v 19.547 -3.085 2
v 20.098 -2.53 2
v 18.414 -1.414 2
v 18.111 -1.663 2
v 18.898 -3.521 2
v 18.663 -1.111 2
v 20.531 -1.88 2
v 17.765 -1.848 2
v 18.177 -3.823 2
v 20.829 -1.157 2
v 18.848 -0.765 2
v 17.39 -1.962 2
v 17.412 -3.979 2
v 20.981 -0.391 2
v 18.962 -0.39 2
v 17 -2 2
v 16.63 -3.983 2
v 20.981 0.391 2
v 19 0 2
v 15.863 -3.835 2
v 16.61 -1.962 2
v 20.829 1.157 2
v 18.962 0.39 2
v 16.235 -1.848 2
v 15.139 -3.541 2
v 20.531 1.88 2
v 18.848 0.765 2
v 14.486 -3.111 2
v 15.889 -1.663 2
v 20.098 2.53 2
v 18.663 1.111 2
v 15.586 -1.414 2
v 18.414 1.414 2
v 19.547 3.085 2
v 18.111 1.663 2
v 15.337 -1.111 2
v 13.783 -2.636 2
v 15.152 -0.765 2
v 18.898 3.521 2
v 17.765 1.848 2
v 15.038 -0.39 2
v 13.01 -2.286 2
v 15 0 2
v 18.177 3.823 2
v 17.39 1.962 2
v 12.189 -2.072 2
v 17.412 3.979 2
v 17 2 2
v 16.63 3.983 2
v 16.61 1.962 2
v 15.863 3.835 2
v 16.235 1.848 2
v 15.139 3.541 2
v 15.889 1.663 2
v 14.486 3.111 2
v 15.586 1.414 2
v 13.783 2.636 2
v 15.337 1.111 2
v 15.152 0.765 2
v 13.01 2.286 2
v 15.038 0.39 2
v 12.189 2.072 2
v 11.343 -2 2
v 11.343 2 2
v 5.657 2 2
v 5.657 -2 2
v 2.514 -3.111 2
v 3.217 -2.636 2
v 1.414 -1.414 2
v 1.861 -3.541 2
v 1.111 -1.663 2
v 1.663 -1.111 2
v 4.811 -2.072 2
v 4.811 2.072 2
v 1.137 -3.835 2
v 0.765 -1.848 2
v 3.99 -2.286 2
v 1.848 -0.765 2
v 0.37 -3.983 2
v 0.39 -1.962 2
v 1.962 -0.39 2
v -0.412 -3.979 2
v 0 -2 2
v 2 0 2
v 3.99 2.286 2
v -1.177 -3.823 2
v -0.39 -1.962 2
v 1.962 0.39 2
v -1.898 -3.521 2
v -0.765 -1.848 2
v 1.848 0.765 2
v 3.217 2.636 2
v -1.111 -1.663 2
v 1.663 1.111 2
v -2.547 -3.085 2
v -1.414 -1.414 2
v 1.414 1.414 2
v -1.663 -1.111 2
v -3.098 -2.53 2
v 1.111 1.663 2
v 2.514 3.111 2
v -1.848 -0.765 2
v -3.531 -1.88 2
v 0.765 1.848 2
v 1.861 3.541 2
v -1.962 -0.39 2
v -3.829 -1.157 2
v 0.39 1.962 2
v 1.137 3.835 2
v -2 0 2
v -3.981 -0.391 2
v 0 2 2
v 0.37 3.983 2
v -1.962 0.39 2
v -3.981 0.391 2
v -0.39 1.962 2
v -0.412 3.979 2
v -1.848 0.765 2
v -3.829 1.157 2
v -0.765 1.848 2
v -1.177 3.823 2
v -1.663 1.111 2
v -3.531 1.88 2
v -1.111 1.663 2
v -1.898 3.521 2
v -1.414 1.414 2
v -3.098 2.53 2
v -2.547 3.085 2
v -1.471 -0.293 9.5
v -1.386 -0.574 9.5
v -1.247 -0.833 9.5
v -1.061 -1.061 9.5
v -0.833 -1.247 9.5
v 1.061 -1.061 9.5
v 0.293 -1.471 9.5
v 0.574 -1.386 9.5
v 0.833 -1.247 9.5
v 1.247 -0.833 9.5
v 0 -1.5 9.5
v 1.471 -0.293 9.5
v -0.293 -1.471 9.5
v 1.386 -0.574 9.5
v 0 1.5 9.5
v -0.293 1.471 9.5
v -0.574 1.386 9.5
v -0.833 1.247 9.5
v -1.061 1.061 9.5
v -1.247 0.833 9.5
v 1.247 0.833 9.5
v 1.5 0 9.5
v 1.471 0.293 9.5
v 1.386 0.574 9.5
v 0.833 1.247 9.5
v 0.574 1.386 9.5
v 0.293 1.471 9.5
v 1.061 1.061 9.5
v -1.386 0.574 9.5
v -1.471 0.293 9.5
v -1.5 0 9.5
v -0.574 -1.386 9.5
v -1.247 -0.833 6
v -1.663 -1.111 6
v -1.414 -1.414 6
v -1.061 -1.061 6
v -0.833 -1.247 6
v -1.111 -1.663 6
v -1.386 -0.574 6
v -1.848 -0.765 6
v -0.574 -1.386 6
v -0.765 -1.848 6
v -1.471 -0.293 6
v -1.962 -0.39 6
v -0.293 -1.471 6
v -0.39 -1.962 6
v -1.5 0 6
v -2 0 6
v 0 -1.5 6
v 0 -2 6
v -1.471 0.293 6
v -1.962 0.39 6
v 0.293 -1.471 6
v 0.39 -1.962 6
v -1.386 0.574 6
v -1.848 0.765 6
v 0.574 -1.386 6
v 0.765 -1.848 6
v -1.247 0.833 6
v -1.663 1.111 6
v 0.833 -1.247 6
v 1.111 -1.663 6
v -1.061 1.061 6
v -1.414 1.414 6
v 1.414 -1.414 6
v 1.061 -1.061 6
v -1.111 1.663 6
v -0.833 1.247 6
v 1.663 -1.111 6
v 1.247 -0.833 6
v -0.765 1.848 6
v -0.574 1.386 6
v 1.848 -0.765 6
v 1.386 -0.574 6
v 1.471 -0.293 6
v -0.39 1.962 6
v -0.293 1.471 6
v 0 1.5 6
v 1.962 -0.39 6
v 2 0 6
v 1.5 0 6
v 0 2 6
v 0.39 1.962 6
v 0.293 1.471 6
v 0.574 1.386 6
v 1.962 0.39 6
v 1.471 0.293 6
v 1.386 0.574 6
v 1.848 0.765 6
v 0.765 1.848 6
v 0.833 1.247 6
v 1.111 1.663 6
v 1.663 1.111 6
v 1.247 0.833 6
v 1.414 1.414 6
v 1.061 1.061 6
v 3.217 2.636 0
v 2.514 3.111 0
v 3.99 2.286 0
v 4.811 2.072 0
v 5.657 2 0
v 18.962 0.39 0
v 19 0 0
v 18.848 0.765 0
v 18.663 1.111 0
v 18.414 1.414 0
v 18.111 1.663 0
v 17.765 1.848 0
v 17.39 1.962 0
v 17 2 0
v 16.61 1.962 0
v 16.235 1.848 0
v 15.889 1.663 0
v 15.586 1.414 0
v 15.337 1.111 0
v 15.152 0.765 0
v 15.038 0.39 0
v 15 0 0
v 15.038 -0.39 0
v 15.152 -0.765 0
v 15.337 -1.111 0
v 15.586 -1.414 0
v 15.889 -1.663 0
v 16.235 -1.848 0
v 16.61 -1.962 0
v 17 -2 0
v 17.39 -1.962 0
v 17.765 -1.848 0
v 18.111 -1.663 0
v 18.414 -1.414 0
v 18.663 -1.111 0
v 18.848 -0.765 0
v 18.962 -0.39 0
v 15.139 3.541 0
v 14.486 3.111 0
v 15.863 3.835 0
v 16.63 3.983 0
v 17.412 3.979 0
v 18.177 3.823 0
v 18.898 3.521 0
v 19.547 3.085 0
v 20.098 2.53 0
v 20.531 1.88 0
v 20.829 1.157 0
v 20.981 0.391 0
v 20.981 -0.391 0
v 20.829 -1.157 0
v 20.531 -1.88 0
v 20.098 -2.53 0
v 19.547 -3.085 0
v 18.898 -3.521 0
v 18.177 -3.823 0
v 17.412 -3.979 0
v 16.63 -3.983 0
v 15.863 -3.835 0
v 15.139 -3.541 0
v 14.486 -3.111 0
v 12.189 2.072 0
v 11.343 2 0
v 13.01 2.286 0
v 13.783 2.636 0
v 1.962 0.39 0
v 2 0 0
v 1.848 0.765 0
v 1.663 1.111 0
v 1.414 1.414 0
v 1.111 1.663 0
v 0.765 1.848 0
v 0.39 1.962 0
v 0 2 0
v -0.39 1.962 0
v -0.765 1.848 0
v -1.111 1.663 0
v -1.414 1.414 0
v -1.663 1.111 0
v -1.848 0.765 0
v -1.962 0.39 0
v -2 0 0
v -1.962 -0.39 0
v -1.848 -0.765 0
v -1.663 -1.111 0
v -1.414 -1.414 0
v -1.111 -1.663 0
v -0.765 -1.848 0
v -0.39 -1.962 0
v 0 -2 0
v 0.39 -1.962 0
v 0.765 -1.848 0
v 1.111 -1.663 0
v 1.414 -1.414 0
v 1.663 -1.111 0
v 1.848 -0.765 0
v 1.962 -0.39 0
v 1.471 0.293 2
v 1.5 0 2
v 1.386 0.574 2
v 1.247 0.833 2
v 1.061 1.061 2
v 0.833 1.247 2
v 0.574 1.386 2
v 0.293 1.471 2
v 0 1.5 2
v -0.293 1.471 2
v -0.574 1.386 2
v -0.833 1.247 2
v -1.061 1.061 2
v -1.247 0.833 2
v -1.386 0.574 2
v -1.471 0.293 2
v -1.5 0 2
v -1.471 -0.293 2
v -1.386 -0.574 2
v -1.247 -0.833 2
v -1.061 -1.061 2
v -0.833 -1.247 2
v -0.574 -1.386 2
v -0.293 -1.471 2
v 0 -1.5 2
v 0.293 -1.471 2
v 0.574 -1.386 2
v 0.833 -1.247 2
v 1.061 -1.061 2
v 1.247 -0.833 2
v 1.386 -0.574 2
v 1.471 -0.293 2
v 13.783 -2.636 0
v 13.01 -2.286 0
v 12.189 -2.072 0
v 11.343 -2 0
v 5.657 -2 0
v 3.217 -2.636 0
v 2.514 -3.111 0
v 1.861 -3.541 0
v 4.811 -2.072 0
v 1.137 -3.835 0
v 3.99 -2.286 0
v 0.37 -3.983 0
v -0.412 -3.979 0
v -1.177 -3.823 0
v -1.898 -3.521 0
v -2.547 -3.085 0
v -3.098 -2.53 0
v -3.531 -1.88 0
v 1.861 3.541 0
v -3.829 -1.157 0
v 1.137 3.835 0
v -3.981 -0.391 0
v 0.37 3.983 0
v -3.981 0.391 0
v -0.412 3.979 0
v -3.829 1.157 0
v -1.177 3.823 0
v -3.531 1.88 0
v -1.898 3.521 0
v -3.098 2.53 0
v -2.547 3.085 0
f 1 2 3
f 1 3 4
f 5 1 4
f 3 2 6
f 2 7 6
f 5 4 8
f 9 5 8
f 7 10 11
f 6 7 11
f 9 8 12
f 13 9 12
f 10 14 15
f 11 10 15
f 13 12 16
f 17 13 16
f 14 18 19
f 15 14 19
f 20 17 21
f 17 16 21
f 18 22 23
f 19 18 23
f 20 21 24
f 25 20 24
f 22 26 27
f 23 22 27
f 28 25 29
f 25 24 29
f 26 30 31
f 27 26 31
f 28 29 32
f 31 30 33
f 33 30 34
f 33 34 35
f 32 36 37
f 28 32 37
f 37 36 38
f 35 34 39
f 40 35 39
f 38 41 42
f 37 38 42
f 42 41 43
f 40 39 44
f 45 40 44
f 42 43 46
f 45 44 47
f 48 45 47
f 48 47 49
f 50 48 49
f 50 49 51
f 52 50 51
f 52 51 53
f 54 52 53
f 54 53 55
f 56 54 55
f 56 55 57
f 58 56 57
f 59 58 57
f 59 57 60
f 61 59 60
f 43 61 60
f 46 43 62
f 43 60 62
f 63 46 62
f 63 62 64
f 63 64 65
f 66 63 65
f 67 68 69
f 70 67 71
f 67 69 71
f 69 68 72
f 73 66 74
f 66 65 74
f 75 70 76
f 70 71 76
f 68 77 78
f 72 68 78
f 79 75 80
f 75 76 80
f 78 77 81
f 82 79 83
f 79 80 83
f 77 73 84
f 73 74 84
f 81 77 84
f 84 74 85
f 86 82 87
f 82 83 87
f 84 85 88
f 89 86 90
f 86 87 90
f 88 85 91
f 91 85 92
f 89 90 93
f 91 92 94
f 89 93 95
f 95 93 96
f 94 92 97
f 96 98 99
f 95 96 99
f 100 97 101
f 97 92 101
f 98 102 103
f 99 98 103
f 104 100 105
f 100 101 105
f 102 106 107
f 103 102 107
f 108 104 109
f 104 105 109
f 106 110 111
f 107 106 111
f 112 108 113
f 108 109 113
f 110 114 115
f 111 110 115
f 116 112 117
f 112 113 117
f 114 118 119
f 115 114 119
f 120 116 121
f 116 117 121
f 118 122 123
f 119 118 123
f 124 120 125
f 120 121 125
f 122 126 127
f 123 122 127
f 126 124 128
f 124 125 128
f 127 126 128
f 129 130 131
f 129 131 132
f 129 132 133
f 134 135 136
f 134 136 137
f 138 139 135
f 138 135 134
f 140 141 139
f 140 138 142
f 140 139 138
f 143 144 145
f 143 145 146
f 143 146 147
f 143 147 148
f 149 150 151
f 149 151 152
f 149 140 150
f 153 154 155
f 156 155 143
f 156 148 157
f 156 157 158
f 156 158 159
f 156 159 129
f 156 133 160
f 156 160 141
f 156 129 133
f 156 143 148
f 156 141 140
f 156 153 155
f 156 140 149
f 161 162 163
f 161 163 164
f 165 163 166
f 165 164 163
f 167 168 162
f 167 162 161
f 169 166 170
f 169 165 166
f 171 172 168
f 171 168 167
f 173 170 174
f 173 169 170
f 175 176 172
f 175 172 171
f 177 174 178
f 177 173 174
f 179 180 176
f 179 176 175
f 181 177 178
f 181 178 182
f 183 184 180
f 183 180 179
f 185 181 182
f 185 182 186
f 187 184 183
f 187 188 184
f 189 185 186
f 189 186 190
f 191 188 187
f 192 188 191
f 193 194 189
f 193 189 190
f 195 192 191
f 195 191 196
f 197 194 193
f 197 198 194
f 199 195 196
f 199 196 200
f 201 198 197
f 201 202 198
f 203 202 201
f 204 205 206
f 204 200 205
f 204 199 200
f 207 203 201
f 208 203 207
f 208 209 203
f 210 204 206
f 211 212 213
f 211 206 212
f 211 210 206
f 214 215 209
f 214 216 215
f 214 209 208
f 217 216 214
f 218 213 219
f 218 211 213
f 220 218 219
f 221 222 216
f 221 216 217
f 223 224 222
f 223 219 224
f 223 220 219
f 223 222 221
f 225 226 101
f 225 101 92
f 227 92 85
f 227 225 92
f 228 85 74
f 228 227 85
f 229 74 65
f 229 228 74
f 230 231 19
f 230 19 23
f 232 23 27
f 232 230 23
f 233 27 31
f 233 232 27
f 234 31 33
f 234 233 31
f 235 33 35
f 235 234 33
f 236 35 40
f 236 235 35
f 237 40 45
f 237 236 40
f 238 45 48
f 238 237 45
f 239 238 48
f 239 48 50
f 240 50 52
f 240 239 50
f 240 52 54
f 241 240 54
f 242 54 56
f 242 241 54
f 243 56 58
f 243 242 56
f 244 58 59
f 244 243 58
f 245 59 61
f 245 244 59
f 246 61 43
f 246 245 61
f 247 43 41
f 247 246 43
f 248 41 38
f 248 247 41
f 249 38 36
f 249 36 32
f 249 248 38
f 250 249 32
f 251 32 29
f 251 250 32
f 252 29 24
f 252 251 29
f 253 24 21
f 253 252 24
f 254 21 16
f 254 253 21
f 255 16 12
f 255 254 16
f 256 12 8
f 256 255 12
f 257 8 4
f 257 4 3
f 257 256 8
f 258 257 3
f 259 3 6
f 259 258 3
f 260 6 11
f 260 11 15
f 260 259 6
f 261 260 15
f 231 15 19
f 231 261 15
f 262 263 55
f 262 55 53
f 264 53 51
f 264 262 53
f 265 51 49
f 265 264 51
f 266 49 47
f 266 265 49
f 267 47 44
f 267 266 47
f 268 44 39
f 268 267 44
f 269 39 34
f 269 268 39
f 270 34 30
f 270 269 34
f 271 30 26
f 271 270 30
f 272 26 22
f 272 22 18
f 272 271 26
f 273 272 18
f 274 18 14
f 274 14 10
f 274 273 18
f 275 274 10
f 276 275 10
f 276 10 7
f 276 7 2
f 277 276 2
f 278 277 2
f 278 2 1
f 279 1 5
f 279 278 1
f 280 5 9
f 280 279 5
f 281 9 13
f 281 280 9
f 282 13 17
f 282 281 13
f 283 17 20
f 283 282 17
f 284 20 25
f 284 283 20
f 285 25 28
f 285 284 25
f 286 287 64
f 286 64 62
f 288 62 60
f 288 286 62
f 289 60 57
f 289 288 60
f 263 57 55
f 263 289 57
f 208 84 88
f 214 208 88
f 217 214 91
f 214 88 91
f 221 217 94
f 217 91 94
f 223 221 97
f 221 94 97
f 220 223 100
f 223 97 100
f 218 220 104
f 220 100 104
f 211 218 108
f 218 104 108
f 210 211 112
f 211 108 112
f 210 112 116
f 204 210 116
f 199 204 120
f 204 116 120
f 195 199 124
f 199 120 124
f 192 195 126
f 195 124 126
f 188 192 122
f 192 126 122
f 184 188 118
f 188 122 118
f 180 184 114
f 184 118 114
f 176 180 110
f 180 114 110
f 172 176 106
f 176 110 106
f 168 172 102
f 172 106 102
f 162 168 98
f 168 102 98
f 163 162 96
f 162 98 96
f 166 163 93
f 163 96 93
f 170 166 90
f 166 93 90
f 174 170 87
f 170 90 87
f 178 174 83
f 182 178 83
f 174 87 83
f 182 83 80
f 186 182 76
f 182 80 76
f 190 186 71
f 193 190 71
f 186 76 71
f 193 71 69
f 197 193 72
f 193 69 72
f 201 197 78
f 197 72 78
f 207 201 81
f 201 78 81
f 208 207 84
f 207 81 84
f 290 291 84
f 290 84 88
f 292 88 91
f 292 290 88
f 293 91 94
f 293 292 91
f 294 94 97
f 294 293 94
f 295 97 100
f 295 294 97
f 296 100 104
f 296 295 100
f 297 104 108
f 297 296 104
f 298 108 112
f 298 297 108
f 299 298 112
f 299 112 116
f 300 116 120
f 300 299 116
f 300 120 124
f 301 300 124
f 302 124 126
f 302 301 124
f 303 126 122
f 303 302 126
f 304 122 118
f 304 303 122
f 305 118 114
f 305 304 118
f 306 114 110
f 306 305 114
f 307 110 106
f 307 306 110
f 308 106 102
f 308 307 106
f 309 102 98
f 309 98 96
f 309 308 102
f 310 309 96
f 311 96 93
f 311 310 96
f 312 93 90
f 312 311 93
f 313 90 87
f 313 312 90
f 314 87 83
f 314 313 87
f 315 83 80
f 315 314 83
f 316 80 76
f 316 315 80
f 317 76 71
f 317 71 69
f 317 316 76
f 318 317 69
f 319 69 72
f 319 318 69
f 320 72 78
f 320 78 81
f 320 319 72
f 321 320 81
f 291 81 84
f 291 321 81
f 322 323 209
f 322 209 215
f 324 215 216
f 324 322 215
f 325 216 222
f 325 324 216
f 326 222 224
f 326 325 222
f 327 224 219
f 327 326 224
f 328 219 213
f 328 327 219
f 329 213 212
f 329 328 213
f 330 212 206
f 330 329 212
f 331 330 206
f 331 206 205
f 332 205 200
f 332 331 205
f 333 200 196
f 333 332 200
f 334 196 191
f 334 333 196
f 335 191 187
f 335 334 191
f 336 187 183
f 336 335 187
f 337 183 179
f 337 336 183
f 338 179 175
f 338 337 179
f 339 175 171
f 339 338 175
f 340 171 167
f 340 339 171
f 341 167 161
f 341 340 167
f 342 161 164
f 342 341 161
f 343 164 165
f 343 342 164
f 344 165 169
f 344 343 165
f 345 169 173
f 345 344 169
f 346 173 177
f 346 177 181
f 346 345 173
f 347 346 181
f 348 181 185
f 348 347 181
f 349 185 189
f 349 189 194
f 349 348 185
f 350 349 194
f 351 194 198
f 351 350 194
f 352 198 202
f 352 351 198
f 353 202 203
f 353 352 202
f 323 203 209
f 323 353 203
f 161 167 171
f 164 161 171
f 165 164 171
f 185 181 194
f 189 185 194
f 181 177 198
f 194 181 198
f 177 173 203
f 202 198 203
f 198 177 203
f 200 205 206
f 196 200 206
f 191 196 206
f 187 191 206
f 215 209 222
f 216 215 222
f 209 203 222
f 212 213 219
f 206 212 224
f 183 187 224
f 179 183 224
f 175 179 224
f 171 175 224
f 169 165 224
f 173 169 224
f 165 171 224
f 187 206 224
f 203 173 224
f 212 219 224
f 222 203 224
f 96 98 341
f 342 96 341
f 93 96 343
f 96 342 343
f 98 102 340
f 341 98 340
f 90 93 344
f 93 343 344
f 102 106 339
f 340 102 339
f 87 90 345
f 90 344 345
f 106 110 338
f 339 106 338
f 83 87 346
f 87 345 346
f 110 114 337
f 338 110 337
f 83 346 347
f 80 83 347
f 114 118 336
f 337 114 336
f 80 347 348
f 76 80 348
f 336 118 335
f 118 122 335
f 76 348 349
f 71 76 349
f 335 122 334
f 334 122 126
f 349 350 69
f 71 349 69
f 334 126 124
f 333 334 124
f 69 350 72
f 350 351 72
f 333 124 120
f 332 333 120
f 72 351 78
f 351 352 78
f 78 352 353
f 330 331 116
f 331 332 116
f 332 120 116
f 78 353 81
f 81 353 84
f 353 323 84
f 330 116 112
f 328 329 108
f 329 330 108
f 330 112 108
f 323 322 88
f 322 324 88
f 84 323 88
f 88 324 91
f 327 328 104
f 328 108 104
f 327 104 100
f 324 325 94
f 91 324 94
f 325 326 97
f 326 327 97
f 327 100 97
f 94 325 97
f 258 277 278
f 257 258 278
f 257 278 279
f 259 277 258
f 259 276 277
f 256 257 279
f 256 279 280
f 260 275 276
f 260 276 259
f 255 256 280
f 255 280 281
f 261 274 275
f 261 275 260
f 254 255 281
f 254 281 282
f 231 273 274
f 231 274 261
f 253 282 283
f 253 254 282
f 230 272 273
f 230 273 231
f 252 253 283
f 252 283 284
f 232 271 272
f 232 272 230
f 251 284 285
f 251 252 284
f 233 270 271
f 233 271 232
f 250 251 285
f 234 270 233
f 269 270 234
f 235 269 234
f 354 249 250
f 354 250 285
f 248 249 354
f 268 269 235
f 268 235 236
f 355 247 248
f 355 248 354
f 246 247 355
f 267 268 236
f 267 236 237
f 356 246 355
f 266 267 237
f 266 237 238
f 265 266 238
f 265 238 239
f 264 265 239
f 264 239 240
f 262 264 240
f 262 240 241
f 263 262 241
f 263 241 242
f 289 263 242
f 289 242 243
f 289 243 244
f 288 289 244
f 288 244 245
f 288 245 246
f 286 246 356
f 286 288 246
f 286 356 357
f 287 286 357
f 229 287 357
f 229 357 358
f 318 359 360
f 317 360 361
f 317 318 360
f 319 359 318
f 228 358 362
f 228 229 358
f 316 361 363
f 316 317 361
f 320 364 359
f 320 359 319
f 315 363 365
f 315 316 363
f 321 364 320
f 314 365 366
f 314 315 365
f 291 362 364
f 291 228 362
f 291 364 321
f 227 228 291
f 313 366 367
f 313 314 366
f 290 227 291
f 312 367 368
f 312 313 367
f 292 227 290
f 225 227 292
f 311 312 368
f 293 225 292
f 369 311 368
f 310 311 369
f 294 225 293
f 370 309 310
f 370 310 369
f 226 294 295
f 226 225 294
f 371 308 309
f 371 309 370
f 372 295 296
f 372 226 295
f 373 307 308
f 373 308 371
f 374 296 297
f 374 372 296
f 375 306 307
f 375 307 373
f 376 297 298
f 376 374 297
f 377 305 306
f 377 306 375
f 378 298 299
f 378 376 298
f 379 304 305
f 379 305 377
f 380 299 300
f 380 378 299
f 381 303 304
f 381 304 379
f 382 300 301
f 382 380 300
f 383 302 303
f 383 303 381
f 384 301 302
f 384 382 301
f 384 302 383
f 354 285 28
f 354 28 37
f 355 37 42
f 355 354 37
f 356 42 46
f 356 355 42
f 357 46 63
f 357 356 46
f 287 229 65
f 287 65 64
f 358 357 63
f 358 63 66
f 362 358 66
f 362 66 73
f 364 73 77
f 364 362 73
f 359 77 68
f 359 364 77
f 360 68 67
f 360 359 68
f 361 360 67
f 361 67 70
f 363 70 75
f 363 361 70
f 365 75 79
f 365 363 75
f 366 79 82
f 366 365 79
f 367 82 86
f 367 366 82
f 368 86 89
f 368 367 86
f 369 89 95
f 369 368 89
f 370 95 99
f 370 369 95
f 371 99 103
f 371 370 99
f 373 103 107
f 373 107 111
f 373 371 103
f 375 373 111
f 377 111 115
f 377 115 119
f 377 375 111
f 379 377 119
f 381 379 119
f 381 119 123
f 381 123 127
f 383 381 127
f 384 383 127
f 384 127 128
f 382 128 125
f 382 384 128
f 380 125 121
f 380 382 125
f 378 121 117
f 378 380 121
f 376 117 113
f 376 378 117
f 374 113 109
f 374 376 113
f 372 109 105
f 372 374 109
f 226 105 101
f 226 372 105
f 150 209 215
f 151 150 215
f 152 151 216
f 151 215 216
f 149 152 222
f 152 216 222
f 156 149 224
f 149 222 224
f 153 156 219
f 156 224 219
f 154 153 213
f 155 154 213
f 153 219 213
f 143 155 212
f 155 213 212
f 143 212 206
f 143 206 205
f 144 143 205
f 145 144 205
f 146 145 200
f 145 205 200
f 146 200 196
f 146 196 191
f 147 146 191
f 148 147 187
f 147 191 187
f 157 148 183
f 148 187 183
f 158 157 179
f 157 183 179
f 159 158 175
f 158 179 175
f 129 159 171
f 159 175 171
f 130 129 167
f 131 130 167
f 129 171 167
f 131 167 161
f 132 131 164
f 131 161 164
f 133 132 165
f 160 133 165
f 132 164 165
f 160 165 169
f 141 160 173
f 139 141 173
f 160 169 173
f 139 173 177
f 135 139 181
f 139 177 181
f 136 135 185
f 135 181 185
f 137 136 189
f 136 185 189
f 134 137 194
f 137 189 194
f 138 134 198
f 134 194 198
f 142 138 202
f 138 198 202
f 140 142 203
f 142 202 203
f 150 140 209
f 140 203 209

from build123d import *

# Parameters (mm, degrees)
SKETCH1_R           = 2
BOSS_EXTRUDE1_DEPTH = 2
SKETCH2_R           = 2
SKETCH2_R_2         = 1.5
BOSS_EXTRUDE2_DEPTH = 4
SKETCH3_R           = 1.5
BOSS_EXTRUDE3_DEPTH = 3.5


with BuildPart() as part:
    # Sketch1 → Boss-Extrude1 (new body)
    with BuildSketch(Plane.XY):
        with BuildLine():
            ThreePointArc((5.656854249, -2), (3.990187583, -2.285954792), (2.514157444, -3.111111111))
            ThreePointArc((2.514157444, -3.111111111), (-4, 0), (2.514157444, 3.111111111))
            ThreePointArc((2.514157444, 3.111111111), (3.990187583, 2.285954792), (5.656854249, 2))
            Line((5.656854249, 2), (11.343145751, 2))
            ThreePointArc((11.343145751, 2), (13.009812417, 2.285954792), (14.485842556, 3.111111111))
            ThreePointArc((14.485842556, 3.111111111), (21, 0), (14.485842556, -3.111111111))
            ThreePointArc((14.485842556, -3.111111111), (13.009812417, -2.285954792), (11.343145751, -2))
            Line((11.343145751, -2), (5.656854249, -2))
        make_face()
        with Locations((17, 0)):
            Circle(SKETCH1_R, mode=Mode.SUBTRACT)
        Circle(SKETCH1_R, mode=Mode.SUBTRACT)
    extrude(amount=BOSS_EXTRUDE1_DEPTH)


with BuildPart() as body_2:
    # Sketch2 → Boss-Extrude2 (new body)
    with BuildSketch(Plane.XY.offset(2)):
        Circle(SKETCH2_R)
        Circle(SKETCH2_R_2, mode=Mode.SUBTRACT)
    extrude(amount=BOSS_EXTRUDE2_DEPTH)


with BuildPart() as body_3:
    # Sketch3 → Boss-Extrude3 (new body)
    with BuildSketch(Plane.XY.offset(6)):
        Circle(SKETCH3_R)
    extrude(amount=BOSS_EXTRUDE3_DEPTH)


solid = Compound([part.part, body_2.part, body_3.part])
